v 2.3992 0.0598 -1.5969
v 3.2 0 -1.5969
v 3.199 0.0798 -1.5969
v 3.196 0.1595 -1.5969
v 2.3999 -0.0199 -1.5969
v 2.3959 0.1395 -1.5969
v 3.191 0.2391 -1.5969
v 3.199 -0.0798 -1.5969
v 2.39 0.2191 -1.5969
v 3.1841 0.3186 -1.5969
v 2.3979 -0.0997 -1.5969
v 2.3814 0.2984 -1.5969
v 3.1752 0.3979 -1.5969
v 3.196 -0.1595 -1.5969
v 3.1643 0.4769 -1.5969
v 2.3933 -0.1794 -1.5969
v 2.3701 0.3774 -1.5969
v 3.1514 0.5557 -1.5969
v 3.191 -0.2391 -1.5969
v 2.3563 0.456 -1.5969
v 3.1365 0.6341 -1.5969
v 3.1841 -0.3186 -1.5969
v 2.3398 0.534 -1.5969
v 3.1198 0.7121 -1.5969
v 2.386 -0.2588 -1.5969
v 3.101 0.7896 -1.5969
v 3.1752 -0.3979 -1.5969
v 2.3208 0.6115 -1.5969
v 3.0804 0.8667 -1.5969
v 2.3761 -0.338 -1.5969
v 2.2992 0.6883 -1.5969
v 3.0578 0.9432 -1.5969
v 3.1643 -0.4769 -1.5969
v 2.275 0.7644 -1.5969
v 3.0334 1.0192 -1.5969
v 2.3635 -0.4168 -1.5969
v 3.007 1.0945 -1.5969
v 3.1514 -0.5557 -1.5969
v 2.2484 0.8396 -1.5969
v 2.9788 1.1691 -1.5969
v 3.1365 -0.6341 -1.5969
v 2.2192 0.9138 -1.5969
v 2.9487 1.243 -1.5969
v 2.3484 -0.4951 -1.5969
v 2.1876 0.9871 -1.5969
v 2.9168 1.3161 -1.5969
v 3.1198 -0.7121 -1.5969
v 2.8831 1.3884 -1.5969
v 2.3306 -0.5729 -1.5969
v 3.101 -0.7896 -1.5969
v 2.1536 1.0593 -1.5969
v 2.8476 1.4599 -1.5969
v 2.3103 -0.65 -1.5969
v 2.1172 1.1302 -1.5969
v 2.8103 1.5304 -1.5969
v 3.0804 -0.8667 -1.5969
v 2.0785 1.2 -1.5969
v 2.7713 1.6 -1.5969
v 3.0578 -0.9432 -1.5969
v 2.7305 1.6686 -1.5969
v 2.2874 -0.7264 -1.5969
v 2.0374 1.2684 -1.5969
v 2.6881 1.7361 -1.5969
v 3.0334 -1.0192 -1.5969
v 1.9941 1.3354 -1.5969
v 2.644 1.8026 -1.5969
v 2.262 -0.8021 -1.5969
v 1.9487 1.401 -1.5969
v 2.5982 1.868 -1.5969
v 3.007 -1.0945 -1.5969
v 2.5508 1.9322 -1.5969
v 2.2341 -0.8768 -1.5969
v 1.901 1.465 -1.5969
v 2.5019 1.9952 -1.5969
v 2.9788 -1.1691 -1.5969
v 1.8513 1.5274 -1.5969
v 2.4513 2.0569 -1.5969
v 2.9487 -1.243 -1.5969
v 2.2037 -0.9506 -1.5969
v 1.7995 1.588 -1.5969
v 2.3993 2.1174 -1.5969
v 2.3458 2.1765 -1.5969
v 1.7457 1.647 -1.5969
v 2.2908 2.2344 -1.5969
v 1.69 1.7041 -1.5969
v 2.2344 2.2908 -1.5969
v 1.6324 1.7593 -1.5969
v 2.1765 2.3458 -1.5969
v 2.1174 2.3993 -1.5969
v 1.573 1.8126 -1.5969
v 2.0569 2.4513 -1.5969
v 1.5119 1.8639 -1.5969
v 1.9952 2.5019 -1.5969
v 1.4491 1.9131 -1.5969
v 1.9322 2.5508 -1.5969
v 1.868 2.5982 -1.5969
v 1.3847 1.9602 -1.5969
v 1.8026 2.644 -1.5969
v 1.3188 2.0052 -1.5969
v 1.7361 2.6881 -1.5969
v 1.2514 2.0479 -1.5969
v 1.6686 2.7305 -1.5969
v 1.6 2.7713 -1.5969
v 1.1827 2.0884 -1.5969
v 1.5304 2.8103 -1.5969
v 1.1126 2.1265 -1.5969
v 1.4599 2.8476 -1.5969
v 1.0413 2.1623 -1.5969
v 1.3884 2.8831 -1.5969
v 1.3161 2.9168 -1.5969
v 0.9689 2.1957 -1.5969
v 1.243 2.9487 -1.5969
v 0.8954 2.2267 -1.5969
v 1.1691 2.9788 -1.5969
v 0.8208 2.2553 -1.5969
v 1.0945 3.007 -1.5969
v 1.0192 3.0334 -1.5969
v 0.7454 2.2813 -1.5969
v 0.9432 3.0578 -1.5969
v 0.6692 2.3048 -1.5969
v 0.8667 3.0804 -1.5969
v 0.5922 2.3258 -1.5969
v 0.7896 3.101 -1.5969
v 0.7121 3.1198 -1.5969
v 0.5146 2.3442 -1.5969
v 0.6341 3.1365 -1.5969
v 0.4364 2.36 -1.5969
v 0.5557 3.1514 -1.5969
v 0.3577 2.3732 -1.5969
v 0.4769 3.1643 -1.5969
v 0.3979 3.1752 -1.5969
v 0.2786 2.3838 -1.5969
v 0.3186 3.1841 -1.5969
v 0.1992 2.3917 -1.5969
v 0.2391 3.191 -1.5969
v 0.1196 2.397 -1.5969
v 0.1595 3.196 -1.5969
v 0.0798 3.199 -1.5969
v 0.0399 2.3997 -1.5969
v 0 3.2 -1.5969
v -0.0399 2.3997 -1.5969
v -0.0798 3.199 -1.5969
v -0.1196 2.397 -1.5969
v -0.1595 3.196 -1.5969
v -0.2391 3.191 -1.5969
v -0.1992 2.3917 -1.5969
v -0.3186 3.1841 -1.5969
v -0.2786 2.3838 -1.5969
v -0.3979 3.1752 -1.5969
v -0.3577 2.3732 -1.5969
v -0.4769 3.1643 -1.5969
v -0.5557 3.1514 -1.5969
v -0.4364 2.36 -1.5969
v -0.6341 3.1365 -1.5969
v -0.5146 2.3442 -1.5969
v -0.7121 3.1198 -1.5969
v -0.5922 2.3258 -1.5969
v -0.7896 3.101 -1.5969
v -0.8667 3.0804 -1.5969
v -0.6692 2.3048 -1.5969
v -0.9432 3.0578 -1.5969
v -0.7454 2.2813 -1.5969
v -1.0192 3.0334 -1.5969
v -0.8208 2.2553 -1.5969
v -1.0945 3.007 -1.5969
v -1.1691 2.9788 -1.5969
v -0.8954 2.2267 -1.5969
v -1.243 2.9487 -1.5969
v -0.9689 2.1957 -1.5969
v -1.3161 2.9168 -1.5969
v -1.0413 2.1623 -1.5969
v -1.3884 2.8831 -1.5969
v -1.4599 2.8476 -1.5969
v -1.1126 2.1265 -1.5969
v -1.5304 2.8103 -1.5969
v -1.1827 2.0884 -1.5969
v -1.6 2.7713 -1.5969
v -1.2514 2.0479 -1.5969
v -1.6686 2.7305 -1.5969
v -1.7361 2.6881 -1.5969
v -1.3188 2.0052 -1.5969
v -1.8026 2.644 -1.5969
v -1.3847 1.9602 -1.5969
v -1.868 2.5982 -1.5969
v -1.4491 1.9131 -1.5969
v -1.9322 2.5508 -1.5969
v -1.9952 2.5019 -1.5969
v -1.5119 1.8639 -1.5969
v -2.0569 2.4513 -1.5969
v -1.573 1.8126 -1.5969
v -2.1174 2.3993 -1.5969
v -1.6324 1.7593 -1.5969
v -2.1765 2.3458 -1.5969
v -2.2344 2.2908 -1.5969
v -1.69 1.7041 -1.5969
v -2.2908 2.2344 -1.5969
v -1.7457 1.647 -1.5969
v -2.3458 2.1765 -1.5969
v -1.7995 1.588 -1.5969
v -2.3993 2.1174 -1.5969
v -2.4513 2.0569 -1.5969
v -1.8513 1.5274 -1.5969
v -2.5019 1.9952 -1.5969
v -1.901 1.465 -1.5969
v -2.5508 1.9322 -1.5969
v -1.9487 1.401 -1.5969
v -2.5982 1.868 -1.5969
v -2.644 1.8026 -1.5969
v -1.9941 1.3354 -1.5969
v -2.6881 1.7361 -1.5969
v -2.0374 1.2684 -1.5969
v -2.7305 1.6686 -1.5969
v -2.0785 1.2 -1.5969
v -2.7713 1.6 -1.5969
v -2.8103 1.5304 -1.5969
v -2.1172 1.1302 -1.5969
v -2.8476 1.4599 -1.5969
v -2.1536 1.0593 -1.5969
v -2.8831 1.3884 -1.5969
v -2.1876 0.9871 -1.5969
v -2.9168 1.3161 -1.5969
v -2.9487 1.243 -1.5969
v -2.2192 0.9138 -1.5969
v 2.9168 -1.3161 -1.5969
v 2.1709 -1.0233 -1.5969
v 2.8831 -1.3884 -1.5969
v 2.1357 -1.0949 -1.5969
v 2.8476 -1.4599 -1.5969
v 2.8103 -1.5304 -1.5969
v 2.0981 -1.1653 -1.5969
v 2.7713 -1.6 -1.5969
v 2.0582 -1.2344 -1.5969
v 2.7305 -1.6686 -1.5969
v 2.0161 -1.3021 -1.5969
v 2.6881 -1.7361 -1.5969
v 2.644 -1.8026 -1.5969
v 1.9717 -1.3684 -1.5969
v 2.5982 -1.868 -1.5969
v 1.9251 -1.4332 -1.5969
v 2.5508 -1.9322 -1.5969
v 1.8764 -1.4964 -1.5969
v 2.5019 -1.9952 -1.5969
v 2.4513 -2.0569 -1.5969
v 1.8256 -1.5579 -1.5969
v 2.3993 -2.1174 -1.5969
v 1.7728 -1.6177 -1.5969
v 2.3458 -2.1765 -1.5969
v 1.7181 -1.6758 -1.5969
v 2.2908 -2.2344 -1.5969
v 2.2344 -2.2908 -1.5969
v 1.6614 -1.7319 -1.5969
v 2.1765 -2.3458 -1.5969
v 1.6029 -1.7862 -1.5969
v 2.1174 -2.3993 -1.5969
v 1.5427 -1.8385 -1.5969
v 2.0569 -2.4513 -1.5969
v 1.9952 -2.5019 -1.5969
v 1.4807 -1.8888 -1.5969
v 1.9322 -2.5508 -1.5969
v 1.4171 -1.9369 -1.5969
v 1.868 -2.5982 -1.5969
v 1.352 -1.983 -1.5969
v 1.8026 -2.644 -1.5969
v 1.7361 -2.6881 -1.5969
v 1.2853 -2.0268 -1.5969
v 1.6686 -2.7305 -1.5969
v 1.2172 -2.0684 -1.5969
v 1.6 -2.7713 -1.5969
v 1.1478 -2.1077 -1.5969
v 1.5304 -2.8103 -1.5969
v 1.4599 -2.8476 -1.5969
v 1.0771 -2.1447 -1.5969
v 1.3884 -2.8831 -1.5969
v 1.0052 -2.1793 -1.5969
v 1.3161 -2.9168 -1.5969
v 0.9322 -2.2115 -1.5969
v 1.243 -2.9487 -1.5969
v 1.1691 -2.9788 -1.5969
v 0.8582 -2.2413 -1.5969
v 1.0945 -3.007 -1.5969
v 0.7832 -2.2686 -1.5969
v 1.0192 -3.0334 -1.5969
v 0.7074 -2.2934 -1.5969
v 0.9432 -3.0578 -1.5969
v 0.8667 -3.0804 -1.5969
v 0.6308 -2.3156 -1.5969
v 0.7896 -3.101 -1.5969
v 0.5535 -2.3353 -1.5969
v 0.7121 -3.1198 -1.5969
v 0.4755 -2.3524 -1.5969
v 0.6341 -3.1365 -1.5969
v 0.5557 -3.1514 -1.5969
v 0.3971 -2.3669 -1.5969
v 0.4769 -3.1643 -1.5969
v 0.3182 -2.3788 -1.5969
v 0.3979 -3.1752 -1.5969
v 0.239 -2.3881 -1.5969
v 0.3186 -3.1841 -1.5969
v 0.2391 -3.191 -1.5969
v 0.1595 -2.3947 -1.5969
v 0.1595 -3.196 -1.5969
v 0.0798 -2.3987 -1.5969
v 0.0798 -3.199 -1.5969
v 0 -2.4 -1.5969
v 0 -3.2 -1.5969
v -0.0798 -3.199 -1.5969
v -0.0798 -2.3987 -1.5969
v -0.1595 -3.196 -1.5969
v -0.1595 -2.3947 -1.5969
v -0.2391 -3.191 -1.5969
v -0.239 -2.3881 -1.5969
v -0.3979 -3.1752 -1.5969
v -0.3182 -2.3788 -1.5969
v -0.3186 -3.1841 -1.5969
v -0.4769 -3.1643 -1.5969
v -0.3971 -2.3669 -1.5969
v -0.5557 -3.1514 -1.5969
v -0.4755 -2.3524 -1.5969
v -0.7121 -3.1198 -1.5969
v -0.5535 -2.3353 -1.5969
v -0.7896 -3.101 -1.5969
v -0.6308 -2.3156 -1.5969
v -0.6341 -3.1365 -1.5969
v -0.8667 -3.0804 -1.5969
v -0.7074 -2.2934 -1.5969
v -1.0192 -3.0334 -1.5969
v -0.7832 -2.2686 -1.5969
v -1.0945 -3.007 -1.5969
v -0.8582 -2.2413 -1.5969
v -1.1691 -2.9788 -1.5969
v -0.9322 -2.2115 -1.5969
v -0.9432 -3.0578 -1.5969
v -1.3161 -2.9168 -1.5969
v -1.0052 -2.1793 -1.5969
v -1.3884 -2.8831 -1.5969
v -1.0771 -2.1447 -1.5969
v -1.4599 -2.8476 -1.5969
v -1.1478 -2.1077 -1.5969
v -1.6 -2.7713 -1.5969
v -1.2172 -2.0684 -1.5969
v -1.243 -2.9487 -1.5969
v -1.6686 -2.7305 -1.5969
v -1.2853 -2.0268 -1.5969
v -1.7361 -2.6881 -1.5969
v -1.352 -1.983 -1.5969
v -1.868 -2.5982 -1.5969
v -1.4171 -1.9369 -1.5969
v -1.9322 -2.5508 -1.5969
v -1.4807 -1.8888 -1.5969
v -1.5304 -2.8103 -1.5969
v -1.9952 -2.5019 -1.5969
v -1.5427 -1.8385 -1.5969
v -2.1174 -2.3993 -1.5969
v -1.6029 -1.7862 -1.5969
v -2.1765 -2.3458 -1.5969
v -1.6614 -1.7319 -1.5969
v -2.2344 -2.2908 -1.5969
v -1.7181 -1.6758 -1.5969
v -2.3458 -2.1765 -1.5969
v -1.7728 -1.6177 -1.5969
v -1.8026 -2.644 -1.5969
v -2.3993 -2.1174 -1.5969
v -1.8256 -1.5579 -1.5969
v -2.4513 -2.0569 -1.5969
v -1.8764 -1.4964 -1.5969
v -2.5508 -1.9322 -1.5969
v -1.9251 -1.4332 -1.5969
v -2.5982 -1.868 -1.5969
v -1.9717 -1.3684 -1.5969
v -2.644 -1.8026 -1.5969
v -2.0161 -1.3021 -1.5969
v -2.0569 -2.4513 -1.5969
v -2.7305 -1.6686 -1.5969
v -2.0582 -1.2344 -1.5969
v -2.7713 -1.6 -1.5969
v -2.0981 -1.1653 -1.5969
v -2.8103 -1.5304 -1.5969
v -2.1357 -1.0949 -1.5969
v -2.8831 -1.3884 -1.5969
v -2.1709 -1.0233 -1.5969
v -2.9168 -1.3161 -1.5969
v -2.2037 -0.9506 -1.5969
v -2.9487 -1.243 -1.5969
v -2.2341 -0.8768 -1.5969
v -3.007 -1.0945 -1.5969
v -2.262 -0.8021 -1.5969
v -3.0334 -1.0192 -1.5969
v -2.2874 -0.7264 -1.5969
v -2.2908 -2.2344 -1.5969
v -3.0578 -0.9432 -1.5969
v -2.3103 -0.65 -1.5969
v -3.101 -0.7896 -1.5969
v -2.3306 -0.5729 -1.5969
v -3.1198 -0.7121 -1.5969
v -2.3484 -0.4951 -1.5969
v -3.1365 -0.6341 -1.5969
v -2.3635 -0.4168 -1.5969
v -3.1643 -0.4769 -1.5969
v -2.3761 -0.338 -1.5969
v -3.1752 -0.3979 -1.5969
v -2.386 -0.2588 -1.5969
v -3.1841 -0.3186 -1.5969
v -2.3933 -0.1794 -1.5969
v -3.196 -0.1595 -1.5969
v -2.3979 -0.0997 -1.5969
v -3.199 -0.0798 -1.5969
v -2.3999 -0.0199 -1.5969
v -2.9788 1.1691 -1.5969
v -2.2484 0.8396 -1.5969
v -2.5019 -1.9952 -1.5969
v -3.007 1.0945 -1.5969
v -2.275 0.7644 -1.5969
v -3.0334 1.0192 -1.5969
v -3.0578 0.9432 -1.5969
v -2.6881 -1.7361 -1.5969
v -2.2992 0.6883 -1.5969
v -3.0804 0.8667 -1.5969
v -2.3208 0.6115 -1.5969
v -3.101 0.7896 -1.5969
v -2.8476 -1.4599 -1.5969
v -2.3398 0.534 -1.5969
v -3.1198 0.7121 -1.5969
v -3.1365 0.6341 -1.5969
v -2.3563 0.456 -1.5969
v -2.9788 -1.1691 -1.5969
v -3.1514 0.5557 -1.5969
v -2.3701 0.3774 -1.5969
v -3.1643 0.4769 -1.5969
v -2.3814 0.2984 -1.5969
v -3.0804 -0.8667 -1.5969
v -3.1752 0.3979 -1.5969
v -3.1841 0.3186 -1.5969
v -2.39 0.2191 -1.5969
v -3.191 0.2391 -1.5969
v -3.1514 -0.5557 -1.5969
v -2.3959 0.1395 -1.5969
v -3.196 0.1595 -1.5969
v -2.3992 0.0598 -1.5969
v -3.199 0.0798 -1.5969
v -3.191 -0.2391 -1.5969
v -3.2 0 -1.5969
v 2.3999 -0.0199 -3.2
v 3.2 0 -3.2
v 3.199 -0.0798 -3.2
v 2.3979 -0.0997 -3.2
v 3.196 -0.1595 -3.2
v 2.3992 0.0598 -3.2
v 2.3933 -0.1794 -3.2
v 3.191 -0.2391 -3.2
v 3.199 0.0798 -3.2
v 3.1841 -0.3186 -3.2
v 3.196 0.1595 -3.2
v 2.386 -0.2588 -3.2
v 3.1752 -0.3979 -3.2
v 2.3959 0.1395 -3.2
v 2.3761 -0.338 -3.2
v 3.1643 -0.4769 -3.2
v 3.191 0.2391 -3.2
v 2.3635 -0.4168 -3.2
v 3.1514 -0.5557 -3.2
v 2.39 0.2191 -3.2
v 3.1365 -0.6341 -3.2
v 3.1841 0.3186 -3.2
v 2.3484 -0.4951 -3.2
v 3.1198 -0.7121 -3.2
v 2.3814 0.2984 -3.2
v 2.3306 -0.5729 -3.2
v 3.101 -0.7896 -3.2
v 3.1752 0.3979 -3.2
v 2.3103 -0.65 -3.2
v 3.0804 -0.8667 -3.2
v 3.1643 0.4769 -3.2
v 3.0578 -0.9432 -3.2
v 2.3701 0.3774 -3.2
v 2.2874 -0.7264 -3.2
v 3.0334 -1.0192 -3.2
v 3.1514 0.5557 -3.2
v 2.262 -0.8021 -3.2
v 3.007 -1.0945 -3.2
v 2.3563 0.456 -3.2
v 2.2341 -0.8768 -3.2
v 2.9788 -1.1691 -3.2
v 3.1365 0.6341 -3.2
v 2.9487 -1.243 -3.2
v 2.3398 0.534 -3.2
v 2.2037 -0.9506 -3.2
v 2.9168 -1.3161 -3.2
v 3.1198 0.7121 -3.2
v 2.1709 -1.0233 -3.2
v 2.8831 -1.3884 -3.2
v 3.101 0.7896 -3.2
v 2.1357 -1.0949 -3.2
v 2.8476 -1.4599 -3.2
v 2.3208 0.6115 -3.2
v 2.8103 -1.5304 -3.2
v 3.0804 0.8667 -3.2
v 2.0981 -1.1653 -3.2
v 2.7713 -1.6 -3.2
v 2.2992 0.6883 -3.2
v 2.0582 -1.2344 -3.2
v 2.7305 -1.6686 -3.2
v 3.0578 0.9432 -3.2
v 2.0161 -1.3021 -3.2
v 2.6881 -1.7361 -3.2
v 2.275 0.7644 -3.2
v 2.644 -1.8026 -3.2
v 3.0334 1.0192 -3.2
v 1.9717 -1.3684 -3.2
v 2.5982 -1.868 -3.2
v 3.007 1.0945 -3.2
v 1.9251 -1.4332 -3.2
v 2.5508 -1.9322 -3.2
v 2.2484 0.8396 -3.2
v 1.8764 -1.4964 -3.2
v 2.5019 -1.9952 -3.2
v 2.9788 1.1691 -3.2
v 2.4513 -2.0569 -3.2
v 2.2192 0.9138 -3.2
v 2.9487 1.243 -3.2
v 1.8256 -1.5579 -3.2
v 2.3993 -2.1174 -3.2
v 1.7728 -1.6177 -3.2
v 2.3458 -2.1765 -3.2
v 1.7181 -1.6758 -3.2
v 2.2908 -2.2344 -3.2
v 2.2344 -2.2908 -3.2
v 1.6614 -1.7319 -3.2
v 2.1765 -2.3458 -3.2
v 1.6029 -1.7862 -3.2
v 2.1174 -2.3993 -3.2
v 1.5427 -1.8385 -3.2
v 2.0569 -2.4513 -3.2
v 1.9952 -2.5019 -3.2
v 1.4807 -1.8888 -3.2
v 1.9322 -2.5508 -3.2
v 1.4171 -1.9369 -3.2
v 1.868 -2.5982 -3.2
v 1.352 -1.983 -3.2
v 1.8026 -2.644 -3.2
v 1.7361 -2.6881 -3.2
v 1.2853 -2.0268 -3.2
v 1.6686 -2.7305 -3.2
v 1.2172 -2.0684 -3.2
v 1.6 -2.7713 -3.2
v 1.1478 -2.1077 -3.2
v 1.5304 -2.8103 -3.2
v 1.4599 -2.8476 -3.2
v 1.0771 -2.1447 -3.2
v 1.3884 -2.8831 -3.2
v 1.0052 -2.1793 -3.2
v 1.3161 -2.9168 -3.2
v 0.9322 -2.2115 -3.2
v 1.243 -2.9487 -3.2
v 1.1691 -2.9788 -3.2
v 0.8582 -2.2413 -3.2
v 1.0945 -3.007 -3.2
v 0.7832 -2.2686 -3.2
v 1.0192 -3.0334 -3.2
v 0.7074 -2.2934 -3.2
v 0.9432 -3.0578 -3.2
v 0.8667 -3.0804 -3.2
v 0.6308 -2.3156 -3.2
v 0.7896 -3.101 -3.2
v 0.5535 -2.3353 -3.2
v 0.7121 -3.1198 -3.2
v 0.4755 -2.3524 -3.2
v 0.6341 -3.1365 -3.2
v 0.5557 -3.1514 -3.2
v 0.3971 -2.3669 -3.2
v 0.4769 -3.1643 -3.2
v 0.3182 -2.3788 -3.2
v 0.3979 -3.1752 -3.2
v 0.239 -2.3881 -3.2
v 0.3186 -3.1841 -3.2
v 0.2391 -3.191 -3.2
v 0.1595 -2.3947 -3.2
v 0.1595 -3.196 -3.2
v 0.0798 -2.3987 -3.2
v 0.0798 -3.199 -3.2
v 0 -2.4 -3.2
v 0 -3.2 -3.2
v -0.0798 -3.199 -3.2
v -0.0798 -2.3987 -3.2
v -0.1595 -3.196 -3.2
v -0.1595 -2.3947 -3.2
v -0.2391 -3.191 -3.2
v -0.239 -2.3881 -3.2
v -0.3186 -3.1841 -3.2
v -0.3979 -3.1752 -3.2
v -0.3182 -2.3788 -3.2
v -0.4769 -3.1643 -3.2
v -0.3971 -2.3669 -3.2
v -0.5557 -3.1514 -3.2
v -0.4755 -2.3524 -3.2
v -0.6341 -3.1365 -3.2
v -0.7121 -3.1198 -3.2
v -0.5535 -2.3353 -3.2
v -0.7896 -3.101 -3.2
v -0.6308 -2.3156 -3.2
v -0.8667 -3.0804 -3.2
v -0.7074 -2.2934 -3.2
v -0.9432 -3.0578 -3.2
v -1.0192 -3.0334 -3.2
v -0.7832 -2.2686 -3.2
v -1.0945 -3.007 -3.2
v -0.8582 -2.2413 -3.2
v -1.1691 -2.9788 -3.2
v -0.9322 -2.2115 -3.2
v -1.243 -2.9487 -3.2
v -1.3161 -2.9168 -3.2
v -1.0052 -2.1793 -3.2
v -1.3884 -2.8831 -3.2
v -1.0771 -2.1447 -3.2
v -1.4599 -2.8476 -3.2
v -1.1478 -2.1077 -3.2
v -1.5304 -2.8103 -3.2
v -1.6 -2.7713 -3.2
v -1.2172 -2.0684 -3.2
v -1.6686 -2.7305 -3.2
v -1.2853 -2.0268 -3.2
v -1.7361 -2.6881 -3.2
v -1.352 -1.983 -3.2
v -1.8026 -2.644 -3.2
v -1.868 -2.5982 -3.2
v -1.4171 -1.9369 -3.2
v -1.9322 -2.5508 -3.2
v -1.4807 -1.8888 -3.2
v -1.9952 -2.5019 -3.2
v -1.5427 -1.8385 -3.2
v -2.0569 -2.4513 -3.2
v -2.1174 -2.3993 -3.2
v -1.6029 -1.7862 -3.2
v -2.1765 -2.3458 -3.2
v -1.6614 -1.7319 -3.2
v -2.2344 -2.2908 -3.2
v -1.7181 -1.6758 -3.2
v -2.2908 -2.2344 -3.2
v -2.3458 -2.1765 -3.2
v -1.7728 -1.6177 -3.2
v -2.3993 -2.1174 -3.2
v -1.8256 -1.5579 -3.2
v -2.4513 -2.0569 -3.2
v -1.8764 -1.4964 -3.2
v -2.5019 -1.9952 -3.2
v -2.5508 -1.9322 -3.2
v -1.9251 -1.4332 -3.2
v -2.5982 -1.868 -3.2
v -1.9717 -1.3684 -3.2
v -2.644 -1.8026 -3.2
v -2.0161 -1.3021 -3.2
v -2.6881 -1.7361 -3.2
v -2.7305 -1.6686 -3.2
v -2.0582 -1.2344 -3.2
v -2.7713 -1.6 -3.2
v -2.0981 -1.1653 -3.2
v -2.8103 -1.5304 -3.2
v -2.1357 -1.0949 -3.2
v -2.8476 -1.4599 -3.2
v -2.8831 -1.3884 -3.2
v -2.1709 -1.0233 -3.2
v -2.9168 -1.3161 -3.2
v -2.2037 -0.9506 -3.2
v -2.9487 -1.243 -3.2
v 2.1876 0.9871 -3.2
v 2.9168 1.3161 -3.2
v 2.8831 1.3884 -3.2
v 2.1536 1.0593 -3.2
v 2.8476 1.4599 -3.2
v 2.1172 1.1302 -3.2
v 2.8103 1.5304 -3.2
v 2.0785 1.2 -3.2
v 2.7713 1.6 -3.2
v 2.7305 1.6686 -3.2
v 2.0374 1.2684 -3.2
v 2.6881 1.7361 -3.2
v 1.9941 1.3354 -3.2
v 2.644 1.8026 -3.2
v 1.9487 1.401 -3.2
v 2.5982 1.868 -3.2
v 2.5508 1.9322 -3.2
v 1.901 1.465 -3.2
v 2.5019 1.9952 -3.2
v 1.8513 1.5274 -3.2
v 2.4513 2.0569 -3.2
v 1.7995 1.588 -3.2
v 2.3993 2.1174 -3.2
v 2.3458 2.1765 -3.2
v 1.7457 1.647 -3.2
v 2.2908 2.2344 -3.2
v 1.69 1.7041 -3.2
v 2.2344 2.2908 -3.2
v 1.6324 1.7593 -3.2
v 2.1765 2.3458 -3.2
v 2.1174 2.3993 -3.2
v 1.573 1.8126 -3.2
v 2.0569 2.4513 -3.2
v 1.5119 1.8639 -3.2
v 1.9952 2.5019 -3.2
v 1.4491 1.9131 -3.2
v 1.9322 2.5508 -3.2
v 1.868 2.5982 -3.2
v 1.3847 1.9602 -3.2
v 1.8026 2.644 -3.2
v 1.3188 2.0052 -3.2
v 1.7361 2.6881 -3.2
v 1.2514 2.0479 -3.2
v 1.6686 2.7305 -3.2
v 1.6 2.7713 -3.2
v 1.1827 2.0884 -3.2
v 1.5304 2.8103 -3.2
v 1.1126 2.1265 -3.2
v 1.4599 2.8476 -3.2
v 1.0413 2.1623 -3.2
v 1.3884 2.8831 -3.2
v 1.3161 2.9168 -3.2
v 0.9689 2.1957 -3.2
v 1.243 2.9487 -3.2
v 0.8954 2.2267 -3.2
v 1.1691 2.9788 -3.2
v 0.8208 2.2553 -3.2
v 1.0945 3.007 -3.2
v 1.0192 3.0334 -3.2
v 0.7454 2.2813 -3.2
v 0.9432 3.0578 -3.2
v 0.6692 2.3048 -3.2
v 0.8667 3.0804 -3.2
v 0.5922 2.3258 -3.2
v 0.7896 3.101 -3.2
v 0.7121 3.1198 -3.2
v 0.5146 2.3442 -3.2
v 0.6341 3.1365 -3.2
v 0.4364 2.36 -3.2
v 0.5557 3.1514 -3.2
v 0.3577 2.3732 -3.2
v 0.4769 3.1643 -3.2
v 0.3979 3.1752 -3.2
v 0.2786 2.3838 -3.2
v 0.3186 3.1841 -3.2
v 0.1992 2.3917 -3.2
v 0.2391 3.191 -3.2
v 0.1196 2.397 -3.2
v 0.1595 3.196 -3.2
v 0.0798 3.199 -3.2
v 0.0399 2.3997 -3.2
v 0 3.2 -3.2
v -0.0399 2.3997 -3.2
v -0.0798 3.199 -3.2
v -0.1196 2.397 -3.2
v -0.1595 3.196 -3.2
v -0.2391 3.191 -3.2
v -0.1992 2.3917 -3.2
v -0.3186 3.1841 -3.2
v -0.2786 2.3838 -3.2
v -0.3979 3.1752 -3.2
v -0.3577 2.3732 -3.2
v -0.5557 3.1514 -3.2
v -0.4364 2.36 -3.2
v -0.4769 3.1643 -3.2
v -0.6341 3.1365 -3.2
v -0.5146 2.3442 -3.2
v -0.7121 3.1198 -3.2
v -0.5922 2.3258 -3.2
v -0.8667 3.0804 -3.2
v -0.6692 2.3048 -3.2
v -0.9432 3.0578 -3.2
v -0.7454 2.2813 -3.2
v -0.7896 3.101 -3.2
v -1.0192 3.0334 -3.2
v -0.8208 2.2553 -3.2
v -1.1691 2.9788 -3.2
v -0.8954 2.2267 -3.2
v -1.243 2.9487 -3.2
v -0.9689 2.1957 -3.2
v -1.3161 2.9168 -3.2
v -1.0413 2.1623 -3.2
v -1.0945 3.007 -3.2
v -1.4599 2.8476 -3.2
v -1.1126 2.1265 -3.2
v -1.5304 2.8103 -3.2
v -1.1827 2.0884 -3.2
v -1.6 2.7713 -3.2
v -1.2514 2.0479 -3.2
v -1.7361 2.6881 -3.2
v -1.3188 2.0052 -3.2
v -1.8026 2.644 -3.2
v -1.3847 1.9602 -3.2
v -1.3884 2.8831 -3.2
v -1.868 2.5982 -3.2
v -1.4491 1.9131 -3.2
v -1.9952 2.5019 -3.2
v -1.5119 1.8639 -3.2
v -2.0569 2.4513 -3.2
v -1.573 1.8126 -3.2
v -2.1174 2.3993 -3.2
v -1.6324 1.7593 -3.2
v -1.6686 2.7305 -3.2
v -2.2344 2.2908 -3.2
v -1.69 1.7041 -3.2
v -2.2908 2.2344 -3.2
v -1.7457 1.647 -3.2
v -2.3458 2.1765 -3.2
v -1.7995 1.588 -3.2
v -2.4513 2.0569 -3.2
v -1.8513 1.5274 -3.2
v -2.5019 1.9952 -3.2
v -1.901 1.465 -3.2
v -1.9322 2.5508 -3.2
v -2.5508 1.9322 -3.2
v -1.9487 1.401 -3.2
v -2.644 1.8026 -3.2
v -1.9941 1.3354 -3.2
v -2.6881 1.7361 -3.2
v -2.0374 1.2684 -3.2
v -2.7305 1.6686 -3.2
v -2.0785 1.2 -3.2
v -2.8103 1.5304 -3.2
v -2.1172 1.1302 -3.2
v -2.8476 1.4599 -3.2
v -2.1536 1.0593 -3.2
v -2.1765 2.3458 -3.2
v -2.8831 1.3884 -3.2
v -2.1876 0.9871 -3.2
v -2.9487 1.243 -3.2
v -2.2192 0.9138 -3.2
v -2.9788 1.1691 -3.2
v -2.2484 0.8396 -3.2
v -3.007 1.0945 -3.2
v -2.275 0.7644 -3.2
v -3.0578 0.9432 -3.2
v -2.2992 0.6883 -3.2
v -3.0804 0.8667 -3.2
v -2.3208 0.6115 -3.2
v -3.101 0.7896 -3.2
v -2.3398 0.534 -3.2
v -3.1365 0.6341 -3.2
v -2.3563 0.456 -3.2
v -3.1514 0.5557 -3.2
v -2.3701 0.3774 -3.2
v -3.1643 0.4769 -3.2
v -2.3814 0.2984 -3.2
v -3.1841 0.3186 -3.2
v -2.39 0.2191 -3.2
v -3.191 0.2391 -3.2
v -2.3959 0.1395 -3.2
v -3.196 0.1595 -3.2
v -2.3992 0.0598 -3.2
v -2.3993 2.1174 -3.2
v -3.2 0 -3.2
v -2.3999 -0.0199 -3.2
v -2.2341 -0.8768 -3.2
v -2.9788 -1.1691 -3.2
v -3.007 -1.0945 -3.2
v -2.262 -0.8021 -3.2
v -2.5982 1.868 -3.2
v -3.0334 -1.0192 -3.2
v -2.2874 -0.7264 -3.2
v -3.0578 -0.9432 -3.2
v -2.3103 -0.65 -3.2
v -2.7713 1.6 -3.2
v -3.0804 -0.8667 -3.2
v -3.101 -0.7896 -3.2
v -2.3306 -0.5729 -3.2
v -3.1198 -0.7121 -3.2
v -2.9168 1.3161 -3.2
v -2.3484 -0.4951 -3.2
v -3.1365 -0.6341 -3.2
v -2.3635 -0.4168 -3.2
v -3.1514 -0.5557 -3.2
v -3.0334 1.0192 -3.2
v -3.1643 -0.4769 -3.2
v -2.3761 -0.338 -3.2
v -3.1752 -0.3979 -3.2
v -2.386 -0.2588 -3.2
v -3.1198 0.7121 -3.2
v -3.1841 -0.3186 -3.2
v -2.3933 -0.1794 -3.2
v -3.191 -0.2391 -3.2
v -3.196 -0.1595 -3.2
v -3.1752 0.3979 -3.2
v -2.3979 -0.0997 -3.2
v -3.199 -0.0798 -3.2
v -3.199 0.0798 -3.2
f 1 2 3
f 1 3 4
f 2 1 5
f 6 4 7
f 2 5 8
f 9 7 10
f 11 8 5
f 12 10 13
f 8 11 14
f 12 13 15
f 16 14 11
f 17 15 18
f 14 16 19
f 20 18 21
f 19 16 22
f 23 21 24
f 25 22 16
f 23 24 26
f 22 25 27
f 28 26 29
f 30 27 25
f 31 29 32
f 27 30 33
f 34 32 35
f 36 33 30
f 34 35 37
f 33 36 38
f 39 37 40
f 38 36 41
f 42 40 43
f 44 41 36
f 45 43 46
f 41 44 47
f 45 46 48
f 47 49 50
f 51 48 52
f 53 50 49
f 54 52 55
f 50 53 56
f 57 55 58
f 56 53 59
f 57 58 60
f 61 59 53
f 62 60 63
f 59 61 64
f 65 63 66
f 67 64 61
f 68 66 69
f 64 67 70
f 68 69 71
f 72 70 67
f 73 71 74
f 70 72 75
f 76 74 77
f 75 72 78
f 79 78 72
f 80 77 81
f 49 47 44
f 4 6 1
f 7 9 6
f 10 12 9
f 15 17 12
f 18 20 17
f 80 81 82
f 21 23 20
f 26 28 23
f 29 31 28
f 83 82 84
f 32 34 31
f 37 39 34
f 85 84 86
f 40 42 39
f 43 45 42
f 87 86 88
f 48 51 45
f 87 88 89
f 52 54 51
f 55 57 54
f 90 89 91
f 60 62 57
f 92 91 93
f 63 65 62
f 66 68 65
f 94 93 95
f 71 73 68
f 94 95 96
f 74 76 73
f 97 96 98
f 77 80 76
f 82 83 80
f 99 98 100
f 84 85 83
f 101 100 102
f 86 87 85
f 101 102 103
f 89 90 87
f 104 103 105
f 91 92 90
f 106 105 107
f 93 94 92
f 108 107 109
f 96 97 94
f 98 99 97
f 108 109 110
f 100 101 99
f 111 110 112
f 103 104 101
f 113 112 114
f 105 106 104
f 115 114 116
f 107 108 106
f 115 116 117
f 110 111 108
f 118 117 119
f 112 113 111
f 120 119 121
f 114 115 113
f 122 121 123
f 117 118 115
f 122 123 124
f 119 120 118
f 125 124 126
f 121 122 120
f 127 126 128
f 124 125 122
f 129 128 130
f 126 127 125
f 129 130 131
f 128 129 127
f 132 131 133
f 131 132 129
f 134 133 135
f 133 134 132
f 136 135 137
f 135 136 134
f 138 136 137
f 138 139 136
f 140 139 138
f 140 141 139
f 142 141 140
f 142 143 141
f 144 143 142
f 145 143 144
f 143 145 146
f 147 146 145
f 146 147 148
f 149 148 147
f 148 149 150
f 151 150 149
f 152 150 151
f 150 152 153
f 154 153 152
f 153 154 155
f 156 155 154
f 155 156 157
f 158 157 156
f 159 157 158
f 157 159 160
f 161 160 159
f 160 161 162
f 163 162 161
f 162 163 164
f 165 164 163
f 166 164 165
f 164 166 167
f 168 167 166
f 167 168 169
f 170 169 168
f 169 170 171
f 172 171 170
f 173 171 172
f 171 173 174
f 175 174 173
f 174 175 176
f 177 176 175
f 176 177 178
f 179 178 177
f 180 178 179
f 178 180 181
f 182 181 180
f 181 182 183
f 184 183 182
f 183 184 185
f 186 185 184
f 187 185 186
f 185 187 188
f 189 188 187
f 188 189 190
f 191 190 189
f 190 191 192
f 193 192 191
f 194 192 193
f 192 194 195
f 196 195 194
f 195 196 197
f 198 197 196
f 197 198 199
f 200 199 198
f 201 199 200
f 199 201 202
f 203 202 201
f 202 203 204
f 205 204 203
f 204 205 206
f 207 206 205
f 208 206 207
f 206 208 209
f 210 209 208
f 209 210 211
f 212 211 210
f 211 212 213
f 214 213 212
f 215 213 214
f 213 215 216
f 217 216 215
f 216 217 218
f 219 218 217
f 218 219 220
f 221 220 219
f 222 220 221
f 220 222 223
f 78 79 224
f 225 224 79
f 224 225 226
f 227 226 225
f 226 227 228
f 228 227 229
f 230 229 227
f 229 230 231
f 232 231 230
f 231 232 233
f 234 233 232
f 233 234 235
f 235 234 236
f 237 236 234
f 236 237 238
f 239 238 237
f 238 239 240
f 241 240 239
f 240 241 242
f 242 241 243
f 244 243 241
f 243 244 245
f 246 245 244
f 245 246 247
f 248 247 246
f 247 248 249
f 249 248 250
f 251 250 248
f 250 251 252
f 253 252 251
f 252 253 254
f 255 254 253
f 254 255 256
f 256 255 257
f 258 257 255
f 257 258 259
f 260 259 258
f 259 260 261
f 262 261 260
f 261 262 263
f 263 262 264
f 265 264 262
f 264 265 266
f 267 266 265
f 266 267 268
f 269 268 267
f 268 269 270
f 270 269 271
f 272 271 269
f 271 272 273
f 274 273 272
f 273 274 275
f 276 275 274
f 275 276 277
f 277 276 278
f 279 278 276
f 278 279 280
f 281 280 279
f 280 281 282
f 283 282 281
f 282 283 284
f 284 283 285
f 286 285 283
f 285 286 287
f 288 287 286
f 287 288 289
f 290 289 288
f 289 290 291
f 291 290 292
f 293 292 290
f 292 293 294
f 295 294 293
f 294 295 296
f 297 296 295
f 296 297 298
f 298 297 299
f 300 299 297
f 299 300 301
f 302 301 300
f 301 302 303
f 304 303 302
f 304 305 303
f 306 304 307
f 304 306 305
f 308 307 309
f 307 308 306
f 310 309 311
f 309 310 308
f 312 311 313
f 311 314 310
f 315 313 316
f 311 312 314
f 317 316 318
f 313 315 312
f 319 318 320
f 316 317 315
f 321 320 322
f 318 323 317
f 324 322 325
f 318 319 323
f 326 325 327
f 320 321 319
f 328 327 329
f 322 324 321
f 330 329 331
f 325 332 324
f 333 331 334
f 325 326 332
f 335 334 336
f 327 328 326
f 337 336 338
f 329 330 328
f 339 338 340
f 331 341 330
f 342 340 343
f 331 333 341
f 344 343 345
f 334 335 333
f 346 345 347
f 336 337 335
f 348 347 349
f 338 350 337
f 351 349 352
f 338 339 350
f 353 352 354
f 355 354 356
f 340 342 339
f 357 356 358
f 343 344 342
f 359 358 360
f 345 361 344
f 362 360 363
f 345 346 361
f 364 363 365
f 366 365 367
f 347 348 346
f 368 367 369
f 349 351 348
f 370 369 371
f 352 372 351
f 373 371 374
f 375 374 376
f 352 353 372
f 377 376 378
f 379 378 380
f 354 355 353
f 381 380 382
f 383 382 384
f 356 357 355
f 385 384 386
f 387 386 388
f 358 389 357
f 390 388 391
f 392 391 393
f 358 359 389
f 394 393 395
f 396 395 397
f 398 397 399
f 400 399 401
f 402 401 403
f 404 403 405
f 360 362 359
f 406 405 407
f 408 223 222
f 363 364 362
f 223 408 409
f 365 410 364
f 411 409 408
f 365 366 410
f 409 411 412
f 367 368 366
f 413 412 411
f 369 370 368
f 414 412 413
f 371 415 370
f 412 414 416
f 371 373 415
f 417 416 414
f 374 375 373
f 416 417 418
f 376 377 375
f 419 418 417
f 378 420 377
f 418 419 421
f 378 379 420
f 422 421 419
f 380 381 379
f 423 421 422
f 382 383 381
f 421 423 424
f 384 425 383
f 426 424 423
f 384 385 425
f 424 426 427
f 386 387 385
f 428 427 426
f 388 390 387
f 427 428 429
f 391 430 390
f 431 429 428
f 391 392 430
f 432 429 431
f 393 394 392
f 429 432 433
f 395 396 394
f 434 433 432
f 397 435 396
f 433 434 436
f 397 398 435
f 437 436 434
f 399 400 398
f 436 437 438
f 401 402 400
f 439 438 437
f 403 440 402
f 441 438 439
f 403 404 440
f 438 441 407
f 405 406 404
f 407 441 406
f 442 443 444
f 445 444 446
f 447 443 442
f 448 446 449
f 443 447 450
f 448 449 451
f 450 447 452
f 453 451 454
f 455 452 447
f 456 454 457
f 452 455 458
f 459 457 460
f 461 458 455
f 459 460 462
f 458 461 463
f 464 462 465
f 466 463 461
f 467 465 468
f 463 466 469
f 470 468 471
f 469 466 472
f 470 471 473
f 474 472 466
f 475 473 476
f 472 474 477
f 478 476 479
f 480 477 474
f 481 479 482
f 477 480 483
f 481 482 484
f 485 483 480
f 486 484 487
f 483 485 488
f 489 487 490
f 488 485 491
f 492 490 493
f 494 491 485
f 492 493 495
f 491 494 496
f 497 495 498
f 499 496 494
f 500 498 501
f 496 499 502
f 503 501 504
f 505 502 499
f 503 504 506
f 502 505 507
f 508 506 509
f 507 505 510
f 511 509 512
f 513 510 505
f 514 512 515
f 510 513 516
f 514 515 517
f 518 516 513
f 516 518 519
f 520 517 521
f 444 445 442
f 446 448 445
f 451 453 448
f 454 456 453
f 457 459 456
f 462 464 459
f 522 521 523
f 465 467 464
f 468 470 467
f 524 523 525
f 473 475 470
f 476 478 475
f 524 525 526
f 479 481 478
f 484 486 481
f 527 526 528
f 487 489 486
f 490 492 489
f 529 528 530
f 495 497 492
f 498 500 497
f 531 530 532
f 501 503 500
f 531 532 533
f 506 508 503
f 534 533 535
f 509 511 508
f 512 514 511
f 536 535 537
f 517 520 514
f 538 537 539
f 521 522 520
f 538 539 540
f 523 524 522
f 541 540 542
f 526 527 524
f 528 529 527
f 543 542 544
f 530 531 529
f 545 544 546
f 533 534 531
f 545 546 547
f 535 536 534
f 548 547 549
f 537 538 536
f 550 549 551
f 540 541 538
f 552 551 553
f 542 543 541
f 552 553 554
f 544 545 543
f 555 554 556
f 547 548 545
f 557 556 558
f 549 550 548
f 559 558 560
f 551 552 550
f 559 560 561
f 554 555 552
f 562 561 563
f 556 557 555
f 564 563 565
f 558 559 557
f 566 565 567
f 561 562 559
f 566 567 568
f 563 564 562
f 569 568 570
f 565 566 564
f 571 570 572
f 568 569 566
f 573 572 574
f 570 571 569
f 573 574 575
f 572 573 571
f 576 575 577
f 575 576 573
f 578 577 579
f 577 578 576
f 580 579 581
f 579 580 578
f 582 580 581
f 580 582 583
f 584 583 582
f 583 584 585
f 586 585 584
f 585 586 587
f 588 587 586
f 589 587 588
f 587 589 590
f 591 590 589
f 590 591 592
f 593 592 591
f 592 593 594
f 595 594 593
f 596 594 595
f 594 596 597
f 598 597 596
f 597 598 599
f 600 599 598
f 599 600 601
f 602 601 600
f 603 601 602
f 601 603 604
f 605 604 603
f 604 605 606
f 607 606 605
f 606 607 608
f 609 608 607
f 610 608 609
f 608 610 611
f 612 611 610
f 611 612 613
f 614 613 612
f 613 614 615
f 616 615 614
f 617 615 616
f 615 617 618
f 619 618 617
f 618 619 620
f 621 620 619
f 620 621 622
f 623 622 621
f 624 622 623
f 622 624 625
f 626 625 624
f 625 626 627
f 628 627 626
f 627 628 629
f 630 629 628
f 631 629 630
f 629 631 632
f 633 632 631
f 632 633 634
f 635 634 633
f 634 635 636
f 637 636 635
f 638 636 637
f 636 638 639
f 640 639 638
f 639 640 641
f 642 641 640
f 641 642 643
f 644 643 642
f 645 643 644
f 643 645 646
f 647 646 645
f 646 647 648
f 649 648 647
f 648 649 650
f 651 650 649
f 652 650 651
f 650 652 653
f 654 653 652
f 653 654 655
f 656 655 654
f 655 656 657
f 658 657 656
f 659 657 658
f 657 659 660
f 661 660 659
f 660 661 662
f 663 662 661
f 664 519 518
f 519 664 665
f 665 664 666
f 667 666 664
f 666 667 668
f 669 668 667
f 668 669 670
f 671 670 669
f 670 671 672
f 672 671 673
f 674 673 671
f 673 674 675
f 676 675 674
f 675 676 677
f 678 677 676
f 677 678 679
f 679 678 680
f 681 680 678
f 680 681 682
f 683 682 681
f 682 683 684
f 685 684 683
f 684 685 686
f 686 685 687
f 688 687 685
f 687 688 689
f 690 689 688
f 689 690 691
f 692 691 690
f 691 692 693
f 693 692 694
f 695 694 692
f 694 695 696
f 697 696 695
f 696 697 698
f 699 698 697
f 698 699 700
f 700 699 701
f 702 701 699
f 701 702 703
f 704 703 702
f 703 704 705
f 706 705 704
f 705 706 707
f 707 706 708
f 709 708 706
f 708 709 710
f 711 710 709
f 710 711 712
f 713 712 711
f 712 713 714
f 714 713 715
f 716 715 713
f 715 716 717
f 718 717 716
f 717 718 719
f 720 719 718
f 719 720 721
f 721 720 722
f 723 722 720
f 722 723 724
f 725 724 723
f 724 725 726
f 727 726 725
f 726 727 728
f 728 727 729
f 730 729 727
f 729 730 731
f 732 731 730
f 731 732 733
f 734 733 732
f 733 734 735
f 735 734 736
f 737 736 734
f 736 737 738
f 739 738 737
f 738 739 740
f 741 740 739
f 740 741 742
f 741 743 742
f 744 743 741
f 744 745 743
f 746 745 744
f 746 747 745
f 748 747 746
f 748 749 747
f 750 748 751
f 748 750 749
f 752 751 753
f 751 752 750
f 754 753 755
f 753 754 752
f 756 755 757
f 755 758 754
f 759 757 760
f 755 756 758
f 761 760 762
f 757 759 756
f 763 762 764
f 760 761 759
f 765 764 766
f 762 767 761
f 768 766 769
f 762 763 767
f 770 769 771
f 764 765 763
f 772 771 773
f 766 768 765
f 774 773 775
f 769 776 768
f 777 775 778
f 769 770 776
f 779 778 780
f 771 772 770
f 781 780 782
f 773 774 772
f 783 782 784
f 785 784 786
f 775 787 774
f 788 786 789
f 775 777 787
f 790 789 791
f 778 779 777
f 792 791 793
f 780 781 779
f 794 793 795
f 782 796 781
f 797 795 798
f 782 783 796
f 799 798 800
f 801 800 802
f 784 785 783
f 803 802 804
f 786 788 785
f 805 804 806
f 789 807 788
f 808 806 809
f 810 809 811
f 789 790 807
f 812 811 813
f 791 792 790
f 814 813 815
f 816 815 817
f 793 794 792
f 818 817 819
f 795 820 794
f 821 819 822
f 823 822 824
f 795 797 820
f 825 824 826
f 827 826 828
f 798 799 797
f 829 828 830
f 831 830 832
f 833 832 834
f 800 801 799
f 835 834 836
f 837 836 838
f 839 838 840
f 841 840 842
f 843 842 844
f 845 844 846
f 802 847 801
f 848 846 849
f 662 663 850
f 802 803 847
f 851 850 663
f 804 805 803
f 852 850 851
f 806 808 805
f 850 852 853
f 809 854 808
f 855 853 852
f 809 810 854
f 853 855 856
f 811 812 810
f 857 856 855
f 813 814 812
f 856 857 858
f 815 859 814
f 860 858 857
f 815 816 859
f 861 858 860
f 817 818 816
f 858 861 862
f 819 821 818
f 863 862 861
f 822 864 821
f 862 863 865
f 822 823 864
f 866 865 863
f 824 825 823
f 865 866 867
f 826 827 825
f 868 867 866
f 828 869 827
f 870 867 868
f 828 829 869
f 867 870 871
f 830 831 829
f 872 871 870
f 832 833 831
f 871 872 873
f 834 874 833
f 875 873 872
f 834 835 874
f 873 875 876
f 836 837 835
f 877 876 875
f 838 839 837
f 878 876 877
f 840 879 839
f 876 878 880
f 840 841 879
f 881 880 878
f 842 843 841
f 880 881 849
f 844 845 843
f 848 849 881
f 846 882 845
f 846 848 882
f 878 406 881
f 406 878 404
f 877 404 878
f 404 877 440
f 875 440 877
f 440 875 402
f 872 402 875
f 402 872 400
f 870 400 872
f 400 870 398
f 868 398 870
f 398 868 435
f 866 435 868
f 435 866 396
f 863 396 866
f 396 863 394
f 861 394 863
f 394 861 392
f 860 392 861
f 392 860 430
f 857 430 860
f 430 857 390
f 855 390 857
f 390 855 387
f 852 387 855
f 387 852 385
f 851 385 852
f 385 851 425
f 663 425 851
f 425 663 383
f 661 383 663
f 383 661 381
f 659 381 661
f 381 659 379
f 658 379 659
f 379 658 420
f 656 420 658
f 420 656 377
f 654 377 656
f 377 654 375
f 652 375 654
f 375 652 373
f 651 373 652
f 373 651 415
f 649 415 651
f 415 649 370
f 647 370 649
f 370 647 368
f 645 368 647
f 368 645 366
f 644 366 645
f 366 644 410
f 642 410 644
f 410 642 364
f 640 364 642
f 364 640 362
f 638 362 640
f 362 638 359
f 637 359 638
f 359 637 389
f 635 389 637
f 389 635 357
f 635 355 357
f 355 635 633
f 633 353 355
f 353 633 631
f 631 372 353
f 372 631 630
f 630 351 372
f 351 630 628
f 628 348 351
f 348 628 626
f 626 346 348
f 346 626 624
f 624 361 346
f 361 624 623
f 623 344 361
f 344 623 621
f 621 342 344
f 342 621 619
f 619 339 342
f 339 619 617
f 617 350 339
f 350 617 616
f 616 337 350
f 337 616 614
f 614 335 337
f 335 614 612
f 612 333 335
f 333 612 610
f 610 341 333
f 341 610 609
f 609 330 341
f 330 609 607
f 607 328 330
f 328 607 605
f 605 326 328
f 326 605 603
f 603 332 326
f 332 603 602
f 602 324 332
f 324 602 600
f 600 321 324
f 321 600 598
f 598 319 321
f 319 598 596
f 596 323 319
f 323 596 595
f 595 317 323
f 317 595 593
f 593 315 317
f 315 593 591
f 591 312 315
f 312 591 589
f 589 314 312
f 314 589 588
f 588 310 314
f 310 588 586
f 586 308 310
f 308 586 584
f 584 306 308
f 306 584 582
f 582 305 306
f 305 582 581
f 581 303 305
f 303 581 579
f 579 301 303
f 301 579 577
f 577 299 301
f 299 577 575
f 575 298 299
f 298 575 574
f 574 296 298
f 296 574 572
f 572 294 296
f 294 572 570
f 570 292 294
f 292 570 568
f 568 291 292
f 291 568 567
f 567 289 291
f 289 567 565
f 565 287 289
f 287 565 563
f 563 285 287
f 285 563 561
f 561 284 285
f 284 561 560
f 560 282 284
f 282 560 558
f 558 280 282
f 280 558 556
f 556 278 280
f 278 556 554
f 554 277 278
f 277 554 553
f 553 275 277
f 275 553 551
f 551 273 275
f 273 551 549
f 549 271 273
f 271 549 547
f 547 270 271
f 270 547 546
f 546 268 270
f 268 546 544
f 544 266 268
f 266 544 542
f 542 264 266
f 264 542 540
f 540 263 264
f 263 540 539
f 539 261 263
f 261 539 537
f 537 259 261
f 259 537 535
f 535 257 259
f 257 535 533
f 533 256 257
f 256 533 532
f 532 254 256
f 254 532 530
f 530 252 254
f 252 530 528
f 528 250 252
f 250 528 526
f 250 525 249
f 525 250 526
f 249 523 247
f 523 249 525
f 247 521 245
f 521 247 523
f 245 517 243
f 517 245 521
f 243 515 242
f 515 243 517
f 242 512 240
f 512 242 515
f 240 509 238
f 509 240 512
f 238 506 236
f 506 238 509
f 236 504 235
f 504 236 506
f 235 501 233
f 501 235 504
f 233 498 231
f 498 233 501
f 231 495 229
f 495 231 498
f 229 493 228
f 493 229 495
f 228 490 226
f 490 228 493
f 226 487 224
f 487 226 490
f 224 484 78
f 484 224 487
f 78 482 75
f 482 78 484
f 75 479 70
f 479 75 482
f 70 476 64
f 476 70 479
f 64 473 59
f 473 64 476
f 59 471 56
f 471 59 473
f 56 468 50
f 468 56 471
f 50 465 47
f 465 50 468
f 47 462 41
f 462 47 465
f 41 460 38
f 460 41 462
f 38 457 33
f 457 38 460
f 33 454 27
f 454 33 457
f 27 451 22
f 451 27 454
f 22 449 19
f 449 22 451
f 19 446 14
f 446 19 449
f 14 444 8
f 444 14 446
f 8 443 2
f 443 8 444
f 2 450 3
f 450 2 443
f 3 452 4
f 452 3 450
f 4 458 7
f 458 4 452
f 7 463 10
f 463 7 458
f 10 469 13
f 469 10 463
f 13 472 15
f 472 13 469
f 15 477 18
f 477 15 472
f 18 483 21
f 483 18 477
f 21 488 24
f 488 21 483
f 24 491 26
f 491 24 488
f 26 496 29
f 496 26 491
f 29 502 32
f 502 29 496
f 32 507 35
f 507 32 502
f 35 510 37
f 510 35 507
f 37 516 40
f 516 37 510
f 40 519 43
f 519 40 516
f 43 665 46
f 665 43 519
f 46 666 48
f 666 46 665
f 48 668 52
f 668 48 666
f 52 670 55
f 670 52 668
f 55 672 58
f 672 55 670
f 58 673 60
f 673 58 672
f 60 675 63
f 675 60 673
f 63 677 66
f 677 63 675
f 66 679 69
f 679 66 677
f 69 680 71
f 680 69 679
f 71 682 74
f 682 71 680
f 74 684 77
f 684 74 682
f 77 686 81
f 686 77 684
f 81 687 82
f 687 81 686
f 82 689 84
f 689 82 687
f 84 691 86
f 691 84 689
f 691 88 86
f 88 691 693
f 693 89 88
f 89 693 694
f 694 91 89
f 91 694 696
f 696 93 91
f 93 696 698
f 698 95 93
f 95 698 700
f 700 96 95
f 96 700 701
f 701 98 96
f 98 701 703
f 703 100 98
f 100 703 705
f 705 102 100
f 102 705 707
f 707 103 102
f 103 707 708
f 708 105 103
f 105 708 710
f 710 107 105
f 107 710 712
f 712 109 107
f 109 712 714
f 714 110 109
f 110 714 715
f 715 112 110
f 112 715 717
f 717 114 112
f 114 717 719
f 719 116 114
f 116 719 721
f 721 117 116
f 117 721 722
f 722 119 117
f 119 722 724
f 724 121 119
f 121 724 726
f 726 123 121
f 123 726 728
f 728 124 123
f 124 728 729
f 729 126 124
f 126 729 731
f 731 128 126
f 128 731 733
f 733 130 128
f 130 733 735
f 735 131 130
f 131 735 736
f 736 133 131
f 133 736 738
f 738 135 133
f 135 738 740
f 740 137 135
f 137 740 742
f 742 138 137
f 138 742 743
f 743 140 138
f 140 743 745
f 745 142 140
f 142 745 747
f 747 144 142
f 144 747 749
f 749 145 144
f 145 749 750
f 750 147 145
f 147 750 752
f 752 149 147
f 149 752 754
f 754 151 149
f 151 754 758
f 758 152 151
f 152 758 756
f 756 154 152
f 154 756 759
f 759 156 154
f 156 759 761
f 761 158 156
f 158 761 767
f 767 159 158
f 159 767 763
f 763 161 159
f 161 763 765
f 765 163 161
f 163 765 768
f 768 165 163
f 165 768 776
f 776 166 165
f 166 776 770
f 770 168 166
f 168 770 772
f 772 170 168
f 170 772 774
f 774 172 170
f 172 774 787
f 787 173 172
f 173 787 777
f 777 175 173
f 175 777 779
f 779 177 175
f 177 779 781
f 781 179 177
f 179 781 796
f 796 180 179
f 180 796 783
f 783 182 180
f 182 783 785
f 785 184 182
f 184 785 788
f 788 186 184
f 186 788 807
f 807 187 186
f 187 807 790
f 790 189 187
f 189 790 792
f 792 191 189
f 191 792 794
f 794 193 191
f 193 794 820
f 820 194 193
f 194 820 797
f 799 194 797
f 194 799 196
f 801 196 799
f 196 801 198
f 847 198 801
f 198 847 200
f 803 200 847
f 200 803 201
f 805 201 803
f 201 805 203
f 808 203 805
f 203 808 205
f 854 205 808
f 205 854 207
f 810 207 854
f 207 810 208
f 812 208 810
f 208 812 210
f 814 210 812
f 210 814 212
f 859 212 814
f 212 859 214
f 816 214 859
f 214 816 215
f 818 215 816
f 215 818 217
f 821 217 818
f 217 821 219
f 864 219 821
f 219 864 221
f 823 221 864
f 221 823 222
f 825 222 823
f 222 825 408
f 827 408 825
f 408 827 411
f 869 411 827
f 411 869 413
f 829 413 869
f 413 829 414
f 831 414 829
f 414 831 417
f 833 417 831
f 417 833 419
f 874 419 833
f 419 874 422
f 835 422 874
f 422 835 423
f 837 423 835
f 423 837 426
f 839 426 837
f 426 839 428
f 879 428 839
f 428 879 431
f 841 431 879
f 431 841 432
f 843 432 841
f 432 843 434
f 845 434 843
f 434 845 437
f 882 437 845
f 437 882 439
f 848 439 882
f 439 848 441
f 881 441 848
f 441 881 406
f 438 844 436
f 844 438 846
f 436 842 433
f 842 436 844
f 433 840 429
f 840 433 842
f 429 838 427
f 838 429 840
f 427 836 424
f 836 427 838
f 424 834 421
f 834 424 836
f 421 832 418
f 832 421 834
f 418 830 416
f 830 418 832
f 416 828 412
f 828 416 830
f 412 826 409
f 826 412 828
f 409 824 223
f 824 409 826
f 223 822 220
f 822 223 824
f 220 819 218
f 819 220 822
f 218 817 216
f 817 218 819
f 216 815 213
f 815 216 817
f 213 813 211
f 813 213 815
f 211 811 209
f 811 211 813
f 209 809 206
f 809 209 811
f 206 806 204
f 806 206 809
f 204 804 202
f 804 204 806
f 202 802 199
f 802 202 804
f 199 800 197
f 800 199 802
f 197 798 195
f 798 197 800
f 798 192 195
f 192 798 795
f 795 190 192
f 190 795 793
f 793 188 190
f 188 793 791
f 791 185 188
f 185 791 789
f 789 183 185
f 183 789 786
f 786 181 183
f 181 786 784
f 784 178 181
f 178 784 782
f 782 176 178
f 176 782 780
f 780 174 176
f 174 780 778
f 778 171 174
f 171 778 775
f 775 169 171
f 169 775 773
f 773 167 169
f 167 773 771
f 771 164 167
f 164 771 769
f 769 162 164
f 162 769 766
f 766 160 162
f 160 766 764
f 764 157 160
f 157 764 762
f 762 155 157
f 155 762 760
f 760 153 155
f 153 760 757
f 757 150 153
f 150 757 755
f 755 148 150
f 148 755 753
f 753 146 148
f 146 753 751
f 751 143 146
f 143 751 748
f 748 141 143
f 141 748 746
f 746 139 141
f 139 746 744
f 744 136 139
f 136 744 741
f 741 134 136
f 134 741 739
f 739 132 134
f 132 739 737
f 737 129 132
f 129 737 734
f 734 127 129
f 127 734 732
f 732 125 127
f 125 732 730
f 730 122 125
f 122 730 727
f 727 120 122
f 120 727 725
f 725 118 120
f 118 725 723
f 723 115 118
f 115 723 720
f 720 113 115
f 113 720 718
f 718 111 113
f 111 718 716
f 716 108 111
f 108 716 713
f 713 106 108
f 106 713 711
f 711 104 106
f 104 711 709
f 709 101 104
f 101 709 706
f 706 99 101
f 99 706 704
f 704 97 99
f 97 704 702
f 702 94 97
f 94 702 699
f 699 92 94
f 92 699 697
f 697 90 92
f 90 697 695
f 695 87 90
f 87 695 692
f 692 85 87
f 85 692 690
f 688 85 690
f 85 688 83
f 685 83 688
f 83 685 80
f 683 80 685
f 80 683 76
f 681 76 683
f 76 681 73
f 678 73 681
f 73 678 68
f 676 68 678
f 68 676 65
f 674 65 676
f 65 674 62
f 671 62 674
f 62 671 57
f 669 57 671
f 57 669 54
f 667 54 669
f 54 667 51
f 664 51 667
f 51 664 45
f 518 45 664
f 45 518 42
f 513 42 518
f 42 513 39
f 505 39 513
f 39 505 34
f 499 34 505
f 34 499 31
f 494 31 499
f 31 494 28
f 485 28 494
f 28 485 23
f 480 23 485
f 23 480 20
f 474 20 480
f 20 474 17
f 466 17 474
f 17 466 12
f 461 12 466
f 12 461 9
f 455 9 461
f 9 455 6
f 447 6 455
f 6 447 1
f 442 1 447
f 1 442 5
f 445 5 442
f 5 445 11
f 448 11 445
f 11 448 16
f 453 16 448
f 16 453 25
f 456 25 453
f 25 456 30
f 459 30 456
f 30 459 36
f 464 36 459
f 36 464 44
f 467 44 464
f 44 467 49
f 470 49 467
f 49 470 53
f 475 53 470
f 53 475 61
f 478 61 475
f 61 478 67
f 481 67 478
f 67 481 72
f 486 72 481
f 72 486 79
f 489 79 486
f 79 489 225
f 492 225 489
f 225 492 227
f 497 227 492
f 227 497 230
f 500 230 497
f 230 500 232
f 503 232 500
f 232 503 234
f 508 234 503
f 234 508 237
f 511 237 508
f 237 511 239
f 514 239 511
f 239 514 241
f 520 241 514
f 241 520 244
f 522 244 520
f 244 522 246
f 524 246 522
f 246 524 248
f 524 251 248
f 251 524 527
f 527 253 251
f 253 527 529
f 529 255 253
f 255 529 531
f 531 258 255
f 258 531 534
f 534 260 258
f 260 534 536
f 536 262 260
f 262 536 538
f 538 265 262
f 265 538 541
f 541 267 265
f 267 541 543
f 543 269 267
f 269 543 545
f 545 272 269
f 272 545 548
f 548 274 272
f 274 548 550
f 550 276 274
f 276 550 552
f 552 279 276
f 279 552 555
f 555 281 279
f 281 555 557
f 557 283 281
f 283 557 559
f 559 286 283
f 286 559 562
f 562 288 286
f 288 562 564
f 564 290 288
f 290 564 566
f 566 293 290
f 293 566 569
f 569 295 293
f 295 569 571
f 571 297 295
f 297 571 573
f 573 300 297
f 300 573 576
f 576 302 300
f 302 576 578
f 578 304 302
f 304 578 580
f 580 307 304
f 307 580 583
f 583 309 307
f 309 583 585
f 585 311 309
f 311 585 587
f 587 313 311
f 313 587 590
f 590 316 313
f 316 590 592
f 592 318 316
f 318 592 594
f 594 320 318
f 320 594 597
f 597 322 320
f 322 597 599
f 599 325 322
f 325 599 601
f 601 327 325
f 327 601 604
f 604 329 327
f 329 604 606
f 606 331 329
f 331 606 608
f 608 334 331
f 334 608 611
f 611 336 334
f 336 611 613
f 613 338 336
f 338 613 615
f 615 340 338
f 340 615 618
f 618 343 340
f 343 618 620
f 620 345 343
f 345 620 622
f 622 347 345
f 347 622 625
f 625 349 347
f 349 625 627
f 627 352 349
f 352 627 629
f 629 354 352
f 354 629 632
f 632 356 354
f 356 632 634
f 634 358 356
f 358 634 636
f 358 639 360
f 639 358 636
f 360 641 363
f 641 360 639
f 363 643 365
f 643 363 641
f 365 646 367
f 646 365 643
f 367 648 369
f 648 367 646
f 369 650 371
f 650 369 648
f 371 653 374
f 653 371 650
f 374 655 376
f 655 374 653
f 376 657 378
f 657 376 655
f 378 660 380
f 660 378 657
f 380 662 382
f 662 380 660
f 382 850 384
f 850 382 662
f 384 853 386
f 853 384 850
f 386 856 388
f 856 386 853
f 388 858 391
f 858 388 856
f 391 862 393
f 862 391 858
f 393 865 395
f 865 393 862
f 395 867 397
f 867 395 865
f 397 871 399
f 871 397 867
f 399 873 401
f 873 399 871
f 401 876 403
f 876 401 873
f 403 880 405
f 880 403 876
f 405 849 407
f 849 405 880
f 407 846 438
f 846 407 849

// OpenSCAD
use <../lib.scad>
use <3068b.scad>
use <../p/4-4con2.scad>
use <../p/4-4cylo.scad>
use <../p/8-8sphe.scad>
$fa=1; $fs=0.2;
function ldraw_lib__6253(realsolid=false) = [
// 0 Belville Parasol Stand
// 0 Name: 6253.dat
// 0 Author: Tore Eriksson [Tore_Eriksson]
// 0 !LDRAW_ORG Part UPDATE 2015-01
// 0 !LICENSE Licensed under CC BY 2.0 and CC BY 4.0 : see CAreadme.txt
// 
// 0 BFC CERTIFY CCW
  [0,"BFC","CERTIFY"],
  [0,"BFC","CCW"],
// 
// 0 !HISTORY 1997-10-29 [PTadmin] Official Update 1997-16
// 0 !HISTORY 2007-07-16 [PTadmin] Header formatted for Contributor Agreement
// 0 !HISTORY 2008-07-01 [PTadmin] Official Update 2008-01
// 0 !HISTORY 2014-11-21 [roland] Auto-corrected with libfix version of LDCad 1.4
// 0 !HISTORY 2014-12-28 [Philo] BFCed, used more primitives
// 0 !HISTORY 2015-10-11 [PTadmin] Official Update 2015-01
// 
// 
// 1 16 0 0 0 1 0 0 0 1 0 0 0 1 3068b.dat
  [1,16,0,0,0,1,0,0,0,1,0,0,0,1, ldraw_lib__3068b(realsolid)],
// 1 16 0 0 0 6 0 0 0 -152 0 0 0 6 4-4cylo.dat
  [1,16,0,0,0,6,0,0,0,-152,0,0,0,6, ldraw_lib__4_4cylo(realsolid)],
// 1 16 0 -160 0 8 0 0 0 8 0 0 0 8 8-8sphe.dat
  [1,16,0,-160,0,8,0,0,0,8,0,0,0,8, ldraw_lib__8_8sphe(realsolid)],
// 1 16 0 -152 0 2 0 0 0 -2 0 0 0 2 4-4con2.dat
  [1,16,0,-152,0,2,0,0,0,-2,0,0,0,2, ldraw_lib__4_4con2(realsolid)],
// 2 24 4.458 -153.542 0 4.026 -153.6424 1.6677
  [2,24,4.458,-153.542,0,4.026,-153.6424,1.6677],
// 2 24 4.026 -153.6424 1.6677 3.4236 -153.5061 2.8096
  [2,24,4.026,-153.6424,1.6677,3.4236,-153.5061,2.8096],
// 2 24 3.4236 -153.5061 2.8096 3.1602 -153.5308 3.1602
  [2,24,3.4236,-153.5061,2.8096,3.1602,-153.5308,3.1602],
// 2 24 2.8096 -153.5061 3.4236 3.1602 -153.5308 3.1602
  [2,24,2.8096,-153.5061,3.4236,3.1602,-153.5308,3.1602],
// 2 24 1.6677 -153.6424 4.026 2.8096 -153.5061 3.4236
  [2,24,1.6677,-153.6424,4.026,2.8096,-153.5061,3.4236],
// 2 24 0 -153.542 4.458 1.6677 -153.6424 4.026
  [2,24,0,-153.542,4.458,1.6677,-153.6424,4.026],
// 2 24 3.4236 -153.5061 -2.8096 4.026 -153.6424 -1.6677
  [2,24,3.4236,-153.5061,-2.8096,4.026,-153.6424,-1.6677],
// 2 24 4.026 -153.6424 -1.6677 4.458 -153.542 0
  [2,24,4.026,-153.6424,-1.6677,4.458,-153.542,0],
// 2 24 2.8096 -153.5061 -3.4236 3.1602 -153.5308 -3.1602
  [2,24,2.8096,-153.5061,-3.4236,3.1602,-153.5308,-3.1602],
// 2 24 3.1602 -153.5308 -3.1602 3.4236 -153.5061 -2.8096
  [2,24,3.1602,-153.5308,-3.1602,3.4236,-153.5061,-2.8096],
// 2 24 0 -153.542 -4.458 1.6677 -153.6424 -4.026
  [2,24,0,-153.542,-4.458,1.6677,-153.6424,-4.026],
// 2 24 1.6677 -153.6424 -4.026 2.8096 -153.5061 -3.4236
  [2,24,1.6677,-153.6424,-4.026,2.8096,-153.5061,-3.4236],
// 2 24 -4.026 -153.6424 1.6677 -3.4236 -153.5061 2.8096
  [2,24,-4.026,-153.6424,1.6677,-3.4236,-153.5061,2.8096],
// 2 24 -4.458 -153.542 0 -4.026 -153.6424 1.6677
  [2,24,-4.458,-153.542,0,-4.026,-153.6424,1.6677],
// 2 24 -3.1602 -153.5308 3.1602 -2.8096 -153.5061 3.4236
  [2,24,-3.1602,-153.5308,3.1602,-2.8096,-153.5061,3.4236],
// 2 24 -3.4236 -153.5061 2.8096 -3.1602 -153.5308 3.1602
  [2,24,-3.4236,-153.5061,2.8096,-3.1602,-153.5308,3.1602],
// 2 24 -1.6677 -153.6424 4.026 0 -153.542 4.458
  [2,24,-1.6677,-153.6424,4.026,0,-153.542,4.458],
// 2 24 -2.8096 -153.5061 3.4236 -1.6677 -153.6424 4.026
  [2,24,-2.8096,-153.5061,3.4236,-1.6677,-153.6424,4.026],
// 2 24 -4.026 -153.6424 -1.6677 -4.458 -153.542 0
  [2,24,-4.026,-153.6424,-1.6677,-4.458,-153.542,0],
// 2 24 -3.4236 -153.5061 -2.8096 -4.026 -153.6424 -1.6677
  [2,24,-3.4236,-153.5061,-2.8096,-4.026,-153.6424,-1.6677],
// 2 24 -3.1602 -153.5308 -3.1602 -3.4236 -153.5061 -2.8096
  [2,24,-3.1602,-153.5308,-3.1602,-3.4236,-153.5061,-2.8096],
// 2 24 -3.1602 -153.5308 -3.1602 -2.8096 -153.5061 -3.4236
  [2,24,-3.1602,-153.5308,-3.1602,-2.8096,-153.5061,-3.4236],
// 2 24 -2.8096 -153.5061 -3.4236 -1.6677 -153.6424 -4.026
  [2,24,-2.8096,-153.5061,-3.4236,-1.6677,-153.6424,-4.026],
// 2 24 -1.6677 -153.6424 -4.026 0 -153.542 -4.458
  [2,24,-1.6677,-153.6424,-4.026,0,-153.542,-4.458],
];
module ldraw_lib__6253(step=0, col=false, unit=2/5, alt=false, line=0.2, solid=!$preview)
    makepoly(ldraw_lib__6253(solid), step=step, col=col, unit=unit, alt=alt, line=line, solid=solid);
ldraw_lib__6253(line=0.2);
